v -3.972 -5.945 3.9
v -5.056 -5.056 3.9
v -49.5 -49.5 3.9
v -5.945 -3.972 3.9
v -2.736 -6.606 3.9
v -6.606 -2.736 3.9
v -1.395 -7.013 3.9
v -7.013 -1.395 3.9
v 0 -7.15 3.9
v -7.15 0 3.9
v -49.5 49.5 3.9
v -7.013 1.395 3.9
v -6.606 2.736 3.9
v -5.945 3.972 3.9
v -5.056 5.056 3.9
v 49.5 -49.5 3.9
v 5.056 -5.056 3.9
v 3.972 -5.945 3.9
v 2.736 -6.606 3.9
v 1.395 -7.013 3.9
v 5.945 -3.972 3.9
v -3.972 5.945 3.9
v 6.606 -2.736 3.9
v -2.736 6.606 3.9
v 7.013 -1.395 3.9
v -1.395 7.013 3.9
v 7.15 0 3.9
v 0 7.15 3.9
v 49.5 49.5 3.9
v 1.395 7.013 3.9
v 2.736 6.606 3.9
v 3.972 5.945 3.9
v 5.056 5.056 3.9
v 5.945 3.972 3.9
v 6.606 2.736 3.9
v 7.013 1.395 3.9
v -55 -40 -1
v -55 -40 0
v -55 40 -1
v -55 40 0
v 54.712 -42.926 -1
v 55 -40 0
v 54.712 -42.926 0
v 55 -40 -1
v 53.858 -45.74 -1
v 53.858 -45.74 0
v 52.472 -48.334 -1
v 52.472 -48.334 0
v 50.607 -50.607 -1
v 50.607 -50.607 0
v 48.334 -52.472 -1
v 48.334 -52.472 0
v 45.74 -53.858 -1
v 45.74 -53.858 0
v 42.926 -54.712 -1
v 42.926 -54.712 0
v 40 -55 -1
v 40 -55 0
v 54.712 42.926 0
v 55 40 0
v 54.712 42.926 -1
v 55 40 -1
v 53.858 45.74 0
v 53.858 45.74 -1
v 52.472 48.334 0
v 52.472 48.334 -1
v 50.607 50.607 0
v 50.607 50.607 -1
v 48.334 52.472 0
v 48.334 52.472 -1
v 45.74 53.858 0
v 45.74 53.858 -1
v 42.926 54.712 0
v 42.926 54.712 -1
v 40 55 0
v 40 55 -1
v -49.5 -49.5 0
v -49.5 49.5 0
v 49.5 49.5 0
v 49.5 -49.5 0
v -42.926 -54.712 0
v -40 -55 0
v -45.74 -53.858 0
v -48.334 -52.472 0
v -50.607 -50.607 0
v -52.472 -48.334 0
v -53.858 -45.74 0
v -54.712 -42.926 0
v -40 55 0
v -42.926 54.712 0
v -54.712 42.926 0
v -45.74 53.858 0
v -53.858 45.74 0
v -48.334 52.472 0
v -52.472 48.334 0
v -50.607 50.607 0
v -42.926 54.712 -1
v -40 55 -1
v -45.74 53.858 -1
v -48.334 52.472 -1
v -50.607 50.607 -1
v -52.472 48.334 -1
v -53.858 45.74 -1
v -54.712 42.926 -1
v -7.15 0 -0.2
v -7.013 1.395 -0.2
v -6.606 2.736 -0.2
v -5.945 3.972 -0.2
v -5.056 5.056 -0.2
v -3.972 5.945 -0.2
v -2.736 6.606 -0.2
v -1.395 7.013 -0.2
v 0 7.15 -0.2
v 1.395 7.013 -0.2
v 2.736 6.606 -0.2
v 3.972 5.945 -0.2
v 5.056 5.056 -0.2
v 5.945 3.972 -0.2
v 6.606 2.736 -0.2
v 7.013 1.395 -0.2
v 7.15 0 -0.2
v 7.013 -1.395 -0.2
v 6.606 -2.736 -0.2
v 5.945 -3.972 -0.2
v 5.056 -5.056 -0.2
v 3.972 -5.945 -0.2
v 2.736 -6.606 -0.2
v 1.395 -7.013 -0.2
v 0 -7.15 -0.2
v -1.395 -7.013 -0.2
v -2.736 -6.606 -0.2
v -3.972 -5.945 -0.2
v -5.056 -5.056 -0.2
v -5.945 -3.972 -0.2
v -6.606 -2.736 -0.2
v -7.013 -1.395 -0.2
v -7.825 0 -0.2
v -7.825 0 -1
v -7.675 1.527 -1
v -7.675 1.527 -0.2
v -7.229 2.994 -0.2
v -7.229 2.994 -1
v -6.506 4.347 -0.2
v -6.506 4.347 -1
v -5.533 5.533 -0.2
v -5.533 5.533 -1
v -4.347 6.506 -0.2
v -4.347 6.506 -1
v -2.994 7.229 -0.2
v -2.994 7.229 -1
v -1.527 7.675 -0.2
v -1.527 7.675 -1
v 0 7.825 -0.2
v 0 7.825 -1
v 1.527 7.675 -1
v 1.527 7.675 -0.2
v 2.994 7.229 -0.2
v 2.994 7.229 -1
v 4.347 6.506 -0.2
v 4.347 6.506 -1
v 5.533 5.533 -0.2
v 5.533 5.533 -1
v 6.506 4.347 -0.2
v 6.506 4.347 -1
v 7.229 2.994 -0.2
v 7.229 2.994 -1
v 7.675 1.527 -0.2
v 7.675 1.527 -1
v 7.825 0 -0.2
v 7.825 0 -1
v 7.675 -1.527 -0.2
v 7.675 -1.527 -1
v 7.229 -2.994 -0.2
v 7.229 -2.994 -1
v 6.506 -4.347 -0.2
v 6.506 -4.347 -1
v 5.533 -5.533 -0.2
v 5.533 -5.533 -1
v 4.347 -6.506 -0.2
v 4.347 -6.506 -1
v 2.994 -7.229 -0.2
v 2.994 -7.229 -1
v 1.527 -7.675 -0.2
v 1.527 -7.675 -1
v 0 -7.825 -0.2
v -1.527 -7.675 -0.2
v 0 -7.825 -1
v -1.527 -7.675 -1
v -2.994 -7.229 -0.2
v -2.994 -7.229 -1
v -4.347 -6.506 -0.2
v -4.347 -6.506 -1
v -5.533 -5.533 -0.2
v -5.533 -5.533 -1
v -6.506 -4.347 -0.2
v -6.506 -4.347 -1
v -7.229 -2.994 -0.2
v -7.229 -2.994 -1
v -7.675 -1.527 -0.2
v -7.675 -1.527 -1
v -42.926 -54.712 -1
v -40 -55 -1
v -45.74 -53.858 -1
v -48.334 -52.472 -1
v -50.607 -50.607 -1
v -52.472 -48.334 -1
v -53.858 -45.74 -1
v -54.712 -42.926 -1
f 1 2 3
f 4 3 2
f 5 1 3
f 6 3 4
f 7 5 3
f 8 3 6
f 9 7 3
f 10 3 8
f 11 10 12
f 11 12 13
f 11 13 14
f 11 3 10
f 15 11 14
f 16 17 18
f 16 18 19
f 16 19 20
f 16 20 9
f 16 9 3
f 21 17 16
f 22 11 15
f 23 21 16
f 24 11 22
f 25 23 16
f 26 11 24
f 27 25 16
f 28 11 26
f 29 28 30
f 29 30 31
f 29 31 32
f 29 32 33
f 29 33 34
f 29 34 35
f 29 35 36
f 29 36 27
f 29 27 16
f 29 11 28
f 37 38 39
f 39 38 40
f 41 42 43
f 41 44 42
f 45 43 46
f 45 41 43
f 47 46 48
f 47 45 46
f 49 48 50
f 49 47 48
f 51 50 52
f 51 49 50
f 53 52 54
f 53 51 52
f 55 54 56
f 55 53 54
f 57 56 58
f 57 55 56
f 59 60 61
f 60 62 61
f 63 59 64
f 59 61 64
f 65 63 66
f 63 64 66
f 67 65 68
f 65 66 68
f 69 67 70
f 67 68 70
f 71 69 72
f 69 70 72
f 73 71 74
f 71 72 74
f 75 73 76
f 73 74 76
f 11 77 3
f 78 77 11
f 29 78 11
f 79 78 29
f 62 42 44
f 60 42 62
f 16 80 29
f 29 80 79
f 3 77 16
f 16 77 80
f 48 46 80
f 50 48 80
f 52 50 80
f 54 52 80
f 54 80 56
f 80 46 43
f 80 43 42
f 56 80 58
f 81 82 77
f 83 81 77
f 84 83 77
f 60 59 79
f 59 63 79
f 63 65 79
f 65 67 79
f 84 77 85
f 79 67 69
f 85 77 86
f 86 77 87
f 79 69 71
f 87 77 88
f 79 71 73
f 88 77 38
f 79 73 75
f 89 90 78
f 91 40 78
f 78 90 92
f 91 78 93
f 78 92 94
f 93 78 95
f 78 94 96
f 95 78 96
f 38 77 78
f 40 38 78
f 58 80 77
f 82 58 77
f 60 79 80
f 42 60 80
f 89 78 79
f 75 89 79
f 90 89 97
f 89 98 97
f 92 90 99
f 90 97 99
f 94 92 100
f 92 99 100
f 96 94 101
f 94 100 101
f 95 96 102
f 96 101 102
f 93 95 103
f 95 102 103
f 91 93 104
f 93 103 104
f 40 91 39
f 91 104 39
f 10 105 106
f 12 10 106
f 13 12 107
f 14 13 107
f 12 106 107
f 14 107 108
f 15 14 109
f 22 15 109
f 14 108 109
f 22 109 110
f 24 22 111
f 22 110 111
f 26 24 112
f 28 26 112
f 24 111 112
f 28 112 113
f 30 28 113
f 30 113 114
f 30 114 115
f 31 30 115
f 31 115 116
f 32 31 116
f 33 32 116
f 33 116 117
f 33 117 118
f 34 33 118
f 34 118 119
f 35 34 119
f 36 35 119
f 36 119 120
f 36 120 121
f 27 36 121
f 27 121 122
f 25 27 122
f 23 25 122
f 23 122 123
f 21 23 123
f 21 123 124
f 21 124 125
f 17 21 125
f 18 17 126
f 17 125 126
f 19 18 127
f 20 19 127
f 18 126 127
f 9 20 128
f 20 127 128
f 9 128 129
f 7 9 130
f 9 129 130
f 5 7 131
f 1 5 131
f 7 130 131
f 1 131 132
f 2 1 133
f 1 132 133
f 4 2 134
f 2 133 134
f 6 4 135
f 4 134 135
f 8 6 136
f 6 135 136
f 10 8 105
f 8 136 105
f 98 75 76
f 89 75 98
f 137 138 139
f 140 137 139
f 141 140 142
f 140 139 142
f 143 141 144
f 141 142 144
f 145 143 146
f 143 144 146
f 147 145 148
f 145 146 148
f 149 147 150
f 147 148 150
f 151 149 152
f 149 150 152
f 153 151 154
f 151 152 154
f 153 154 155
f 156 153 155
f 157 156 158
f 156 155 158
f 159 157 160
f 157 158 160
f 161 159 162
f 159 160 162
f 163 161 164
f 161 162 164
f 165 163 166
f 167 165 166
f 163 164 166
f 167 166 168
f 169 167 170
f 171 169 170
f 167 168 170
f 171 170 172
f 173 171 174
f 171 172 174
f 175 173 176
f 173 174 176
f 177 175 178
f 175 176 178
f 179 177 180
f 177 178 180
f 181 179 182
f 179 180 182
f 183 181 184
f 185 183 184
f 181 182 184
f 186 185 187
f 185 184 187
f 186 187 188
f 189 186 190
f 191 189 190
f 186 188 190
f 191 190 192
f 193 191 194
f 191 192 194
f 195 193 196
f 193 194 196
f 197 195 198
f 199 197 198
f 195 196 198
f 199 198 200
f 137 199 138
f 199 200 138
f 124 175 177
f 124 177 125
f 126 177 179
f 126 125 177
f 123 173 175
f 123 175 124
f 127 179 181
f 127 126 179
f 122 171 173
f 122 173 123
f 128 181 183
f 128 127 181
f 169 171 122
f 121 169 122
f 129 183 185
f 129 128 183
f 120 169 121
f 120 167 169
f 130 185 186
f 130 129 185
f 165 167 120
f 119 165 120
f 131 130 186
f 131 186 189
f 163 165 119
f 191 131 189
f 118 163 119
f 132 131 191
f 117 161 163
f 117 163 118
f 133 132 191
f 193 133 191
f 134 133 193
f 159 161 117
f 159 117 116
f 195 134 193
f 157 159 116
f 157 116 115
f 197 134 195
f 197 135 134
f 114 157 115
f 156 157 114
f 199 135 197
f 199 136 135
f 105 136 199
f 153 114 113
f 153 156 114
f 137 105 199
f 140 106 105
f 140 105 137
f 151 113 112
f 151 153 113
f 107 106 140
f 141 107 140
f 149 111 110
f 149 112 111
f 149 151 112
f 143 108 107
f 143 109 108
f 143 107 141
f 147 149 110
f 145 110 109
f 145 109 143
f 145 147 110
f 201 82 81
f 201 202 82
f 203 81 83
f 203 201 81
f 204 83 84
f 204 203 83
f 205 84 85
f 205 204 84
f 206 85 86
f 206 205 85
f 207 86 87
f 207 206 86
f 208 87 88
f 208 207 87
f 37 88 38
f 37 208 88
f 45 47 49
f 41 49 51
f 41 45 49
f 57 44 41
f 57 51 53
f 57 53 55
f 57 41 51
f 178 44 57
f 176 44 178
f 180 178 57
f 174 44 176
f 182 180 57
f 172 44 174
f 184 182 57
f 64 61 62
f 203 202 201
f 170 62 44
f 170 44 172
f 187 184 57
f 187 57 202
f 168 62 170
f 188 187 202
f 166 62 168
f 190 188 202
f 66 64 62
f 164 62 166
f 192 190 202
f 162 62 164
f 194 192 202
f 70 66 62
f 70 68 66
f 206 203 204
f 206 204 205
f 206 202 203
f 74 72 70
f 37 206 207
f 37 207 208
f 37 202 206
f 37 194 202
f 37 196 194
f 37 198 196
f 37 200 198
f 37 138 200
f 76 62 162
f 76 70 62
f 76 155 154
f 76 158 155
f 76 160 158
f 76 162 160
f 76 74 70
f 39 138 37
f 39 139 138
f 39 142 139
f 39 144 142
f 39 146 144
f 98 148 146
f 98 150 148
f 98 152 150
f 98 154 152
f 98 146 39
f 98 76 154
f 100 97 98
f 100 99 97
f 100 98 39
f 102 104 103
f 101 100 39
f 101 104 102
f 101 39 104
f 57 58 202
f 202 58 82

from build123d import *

# Parameters (mm, degrees)
SKETCH_1_W          = 99
SKETCH_1_H          = 99
EXTRUDE_1_DEPTH     = 3.9
SKETCH_2_W          = 110
SKETCH_2_H          = 110
EXTRUDE_2_DEPTH     = 1
SKETCH_3_R          = 7.15
CUT_EXTRUDE_1_DEPTH = 78.935935229
SKETCH_5_R          = 7.825
CUT_EXTRUDE_2_DEPTH = 0.8
FILLET_1_R          = 15


with BuildPart() as part:
    # 草图1 → 凸台-拉伸1 (new body)
    with BuildSketch(Plane.XY):
        Rectangle(SKETCH_1_W, SKETCH_1_H)
    extrude(amount=EXTRUDE_1_DEPTH)

    # 草图2 → 凸台-拉伸2 (add)
    with BuildSketch(Plane(origin=(0, 0, 0), x_dir=(-1, 0, 0), z_dir=(0, 0, -1))):
        Rectangle(SKETCH_2_W, SKETCH_2_H)
    extrude(amount=EXTRUDE_2_DEPTH)

    # 草图3 → 切除-拉伸1 (cut, through all)
    with BuildSketch(Plane(origin=(0, 0, -1), x_dir=(-1, 0, 0), z_dir=(0, 0, -1))):
        Circle(SKETCH_3_R)
    extrude(amount=-CUT_EXTRUDE_1_DEPTH, mode=Mode.SUBTRACT)

    # 草图5 → 切除-拉伸2 (cut)
    with BuildSketch(Plane(origin=(0, 0, -1), x_dir=(-1, 0, 0), z_dir=(0, 0, -1))):
        Circle(SKETCH_5_R)
    extrude(amount=-CUT_EXTRUDE_2_DEPTH, mode=Mode.SUBTRACT)

    # 圆角1
    fillet_1_edges = [part.edges().sort_by_distance(p)[0] for p in [
        (-55, -55, -0.5),
        (-55, 55, -0.5),
        (55, 55, -0.5),
        (55, -55, -0.5),
    ]]
    fillet(fillet_1_edges, radius=FILLET_1_R)


solid = part.part
